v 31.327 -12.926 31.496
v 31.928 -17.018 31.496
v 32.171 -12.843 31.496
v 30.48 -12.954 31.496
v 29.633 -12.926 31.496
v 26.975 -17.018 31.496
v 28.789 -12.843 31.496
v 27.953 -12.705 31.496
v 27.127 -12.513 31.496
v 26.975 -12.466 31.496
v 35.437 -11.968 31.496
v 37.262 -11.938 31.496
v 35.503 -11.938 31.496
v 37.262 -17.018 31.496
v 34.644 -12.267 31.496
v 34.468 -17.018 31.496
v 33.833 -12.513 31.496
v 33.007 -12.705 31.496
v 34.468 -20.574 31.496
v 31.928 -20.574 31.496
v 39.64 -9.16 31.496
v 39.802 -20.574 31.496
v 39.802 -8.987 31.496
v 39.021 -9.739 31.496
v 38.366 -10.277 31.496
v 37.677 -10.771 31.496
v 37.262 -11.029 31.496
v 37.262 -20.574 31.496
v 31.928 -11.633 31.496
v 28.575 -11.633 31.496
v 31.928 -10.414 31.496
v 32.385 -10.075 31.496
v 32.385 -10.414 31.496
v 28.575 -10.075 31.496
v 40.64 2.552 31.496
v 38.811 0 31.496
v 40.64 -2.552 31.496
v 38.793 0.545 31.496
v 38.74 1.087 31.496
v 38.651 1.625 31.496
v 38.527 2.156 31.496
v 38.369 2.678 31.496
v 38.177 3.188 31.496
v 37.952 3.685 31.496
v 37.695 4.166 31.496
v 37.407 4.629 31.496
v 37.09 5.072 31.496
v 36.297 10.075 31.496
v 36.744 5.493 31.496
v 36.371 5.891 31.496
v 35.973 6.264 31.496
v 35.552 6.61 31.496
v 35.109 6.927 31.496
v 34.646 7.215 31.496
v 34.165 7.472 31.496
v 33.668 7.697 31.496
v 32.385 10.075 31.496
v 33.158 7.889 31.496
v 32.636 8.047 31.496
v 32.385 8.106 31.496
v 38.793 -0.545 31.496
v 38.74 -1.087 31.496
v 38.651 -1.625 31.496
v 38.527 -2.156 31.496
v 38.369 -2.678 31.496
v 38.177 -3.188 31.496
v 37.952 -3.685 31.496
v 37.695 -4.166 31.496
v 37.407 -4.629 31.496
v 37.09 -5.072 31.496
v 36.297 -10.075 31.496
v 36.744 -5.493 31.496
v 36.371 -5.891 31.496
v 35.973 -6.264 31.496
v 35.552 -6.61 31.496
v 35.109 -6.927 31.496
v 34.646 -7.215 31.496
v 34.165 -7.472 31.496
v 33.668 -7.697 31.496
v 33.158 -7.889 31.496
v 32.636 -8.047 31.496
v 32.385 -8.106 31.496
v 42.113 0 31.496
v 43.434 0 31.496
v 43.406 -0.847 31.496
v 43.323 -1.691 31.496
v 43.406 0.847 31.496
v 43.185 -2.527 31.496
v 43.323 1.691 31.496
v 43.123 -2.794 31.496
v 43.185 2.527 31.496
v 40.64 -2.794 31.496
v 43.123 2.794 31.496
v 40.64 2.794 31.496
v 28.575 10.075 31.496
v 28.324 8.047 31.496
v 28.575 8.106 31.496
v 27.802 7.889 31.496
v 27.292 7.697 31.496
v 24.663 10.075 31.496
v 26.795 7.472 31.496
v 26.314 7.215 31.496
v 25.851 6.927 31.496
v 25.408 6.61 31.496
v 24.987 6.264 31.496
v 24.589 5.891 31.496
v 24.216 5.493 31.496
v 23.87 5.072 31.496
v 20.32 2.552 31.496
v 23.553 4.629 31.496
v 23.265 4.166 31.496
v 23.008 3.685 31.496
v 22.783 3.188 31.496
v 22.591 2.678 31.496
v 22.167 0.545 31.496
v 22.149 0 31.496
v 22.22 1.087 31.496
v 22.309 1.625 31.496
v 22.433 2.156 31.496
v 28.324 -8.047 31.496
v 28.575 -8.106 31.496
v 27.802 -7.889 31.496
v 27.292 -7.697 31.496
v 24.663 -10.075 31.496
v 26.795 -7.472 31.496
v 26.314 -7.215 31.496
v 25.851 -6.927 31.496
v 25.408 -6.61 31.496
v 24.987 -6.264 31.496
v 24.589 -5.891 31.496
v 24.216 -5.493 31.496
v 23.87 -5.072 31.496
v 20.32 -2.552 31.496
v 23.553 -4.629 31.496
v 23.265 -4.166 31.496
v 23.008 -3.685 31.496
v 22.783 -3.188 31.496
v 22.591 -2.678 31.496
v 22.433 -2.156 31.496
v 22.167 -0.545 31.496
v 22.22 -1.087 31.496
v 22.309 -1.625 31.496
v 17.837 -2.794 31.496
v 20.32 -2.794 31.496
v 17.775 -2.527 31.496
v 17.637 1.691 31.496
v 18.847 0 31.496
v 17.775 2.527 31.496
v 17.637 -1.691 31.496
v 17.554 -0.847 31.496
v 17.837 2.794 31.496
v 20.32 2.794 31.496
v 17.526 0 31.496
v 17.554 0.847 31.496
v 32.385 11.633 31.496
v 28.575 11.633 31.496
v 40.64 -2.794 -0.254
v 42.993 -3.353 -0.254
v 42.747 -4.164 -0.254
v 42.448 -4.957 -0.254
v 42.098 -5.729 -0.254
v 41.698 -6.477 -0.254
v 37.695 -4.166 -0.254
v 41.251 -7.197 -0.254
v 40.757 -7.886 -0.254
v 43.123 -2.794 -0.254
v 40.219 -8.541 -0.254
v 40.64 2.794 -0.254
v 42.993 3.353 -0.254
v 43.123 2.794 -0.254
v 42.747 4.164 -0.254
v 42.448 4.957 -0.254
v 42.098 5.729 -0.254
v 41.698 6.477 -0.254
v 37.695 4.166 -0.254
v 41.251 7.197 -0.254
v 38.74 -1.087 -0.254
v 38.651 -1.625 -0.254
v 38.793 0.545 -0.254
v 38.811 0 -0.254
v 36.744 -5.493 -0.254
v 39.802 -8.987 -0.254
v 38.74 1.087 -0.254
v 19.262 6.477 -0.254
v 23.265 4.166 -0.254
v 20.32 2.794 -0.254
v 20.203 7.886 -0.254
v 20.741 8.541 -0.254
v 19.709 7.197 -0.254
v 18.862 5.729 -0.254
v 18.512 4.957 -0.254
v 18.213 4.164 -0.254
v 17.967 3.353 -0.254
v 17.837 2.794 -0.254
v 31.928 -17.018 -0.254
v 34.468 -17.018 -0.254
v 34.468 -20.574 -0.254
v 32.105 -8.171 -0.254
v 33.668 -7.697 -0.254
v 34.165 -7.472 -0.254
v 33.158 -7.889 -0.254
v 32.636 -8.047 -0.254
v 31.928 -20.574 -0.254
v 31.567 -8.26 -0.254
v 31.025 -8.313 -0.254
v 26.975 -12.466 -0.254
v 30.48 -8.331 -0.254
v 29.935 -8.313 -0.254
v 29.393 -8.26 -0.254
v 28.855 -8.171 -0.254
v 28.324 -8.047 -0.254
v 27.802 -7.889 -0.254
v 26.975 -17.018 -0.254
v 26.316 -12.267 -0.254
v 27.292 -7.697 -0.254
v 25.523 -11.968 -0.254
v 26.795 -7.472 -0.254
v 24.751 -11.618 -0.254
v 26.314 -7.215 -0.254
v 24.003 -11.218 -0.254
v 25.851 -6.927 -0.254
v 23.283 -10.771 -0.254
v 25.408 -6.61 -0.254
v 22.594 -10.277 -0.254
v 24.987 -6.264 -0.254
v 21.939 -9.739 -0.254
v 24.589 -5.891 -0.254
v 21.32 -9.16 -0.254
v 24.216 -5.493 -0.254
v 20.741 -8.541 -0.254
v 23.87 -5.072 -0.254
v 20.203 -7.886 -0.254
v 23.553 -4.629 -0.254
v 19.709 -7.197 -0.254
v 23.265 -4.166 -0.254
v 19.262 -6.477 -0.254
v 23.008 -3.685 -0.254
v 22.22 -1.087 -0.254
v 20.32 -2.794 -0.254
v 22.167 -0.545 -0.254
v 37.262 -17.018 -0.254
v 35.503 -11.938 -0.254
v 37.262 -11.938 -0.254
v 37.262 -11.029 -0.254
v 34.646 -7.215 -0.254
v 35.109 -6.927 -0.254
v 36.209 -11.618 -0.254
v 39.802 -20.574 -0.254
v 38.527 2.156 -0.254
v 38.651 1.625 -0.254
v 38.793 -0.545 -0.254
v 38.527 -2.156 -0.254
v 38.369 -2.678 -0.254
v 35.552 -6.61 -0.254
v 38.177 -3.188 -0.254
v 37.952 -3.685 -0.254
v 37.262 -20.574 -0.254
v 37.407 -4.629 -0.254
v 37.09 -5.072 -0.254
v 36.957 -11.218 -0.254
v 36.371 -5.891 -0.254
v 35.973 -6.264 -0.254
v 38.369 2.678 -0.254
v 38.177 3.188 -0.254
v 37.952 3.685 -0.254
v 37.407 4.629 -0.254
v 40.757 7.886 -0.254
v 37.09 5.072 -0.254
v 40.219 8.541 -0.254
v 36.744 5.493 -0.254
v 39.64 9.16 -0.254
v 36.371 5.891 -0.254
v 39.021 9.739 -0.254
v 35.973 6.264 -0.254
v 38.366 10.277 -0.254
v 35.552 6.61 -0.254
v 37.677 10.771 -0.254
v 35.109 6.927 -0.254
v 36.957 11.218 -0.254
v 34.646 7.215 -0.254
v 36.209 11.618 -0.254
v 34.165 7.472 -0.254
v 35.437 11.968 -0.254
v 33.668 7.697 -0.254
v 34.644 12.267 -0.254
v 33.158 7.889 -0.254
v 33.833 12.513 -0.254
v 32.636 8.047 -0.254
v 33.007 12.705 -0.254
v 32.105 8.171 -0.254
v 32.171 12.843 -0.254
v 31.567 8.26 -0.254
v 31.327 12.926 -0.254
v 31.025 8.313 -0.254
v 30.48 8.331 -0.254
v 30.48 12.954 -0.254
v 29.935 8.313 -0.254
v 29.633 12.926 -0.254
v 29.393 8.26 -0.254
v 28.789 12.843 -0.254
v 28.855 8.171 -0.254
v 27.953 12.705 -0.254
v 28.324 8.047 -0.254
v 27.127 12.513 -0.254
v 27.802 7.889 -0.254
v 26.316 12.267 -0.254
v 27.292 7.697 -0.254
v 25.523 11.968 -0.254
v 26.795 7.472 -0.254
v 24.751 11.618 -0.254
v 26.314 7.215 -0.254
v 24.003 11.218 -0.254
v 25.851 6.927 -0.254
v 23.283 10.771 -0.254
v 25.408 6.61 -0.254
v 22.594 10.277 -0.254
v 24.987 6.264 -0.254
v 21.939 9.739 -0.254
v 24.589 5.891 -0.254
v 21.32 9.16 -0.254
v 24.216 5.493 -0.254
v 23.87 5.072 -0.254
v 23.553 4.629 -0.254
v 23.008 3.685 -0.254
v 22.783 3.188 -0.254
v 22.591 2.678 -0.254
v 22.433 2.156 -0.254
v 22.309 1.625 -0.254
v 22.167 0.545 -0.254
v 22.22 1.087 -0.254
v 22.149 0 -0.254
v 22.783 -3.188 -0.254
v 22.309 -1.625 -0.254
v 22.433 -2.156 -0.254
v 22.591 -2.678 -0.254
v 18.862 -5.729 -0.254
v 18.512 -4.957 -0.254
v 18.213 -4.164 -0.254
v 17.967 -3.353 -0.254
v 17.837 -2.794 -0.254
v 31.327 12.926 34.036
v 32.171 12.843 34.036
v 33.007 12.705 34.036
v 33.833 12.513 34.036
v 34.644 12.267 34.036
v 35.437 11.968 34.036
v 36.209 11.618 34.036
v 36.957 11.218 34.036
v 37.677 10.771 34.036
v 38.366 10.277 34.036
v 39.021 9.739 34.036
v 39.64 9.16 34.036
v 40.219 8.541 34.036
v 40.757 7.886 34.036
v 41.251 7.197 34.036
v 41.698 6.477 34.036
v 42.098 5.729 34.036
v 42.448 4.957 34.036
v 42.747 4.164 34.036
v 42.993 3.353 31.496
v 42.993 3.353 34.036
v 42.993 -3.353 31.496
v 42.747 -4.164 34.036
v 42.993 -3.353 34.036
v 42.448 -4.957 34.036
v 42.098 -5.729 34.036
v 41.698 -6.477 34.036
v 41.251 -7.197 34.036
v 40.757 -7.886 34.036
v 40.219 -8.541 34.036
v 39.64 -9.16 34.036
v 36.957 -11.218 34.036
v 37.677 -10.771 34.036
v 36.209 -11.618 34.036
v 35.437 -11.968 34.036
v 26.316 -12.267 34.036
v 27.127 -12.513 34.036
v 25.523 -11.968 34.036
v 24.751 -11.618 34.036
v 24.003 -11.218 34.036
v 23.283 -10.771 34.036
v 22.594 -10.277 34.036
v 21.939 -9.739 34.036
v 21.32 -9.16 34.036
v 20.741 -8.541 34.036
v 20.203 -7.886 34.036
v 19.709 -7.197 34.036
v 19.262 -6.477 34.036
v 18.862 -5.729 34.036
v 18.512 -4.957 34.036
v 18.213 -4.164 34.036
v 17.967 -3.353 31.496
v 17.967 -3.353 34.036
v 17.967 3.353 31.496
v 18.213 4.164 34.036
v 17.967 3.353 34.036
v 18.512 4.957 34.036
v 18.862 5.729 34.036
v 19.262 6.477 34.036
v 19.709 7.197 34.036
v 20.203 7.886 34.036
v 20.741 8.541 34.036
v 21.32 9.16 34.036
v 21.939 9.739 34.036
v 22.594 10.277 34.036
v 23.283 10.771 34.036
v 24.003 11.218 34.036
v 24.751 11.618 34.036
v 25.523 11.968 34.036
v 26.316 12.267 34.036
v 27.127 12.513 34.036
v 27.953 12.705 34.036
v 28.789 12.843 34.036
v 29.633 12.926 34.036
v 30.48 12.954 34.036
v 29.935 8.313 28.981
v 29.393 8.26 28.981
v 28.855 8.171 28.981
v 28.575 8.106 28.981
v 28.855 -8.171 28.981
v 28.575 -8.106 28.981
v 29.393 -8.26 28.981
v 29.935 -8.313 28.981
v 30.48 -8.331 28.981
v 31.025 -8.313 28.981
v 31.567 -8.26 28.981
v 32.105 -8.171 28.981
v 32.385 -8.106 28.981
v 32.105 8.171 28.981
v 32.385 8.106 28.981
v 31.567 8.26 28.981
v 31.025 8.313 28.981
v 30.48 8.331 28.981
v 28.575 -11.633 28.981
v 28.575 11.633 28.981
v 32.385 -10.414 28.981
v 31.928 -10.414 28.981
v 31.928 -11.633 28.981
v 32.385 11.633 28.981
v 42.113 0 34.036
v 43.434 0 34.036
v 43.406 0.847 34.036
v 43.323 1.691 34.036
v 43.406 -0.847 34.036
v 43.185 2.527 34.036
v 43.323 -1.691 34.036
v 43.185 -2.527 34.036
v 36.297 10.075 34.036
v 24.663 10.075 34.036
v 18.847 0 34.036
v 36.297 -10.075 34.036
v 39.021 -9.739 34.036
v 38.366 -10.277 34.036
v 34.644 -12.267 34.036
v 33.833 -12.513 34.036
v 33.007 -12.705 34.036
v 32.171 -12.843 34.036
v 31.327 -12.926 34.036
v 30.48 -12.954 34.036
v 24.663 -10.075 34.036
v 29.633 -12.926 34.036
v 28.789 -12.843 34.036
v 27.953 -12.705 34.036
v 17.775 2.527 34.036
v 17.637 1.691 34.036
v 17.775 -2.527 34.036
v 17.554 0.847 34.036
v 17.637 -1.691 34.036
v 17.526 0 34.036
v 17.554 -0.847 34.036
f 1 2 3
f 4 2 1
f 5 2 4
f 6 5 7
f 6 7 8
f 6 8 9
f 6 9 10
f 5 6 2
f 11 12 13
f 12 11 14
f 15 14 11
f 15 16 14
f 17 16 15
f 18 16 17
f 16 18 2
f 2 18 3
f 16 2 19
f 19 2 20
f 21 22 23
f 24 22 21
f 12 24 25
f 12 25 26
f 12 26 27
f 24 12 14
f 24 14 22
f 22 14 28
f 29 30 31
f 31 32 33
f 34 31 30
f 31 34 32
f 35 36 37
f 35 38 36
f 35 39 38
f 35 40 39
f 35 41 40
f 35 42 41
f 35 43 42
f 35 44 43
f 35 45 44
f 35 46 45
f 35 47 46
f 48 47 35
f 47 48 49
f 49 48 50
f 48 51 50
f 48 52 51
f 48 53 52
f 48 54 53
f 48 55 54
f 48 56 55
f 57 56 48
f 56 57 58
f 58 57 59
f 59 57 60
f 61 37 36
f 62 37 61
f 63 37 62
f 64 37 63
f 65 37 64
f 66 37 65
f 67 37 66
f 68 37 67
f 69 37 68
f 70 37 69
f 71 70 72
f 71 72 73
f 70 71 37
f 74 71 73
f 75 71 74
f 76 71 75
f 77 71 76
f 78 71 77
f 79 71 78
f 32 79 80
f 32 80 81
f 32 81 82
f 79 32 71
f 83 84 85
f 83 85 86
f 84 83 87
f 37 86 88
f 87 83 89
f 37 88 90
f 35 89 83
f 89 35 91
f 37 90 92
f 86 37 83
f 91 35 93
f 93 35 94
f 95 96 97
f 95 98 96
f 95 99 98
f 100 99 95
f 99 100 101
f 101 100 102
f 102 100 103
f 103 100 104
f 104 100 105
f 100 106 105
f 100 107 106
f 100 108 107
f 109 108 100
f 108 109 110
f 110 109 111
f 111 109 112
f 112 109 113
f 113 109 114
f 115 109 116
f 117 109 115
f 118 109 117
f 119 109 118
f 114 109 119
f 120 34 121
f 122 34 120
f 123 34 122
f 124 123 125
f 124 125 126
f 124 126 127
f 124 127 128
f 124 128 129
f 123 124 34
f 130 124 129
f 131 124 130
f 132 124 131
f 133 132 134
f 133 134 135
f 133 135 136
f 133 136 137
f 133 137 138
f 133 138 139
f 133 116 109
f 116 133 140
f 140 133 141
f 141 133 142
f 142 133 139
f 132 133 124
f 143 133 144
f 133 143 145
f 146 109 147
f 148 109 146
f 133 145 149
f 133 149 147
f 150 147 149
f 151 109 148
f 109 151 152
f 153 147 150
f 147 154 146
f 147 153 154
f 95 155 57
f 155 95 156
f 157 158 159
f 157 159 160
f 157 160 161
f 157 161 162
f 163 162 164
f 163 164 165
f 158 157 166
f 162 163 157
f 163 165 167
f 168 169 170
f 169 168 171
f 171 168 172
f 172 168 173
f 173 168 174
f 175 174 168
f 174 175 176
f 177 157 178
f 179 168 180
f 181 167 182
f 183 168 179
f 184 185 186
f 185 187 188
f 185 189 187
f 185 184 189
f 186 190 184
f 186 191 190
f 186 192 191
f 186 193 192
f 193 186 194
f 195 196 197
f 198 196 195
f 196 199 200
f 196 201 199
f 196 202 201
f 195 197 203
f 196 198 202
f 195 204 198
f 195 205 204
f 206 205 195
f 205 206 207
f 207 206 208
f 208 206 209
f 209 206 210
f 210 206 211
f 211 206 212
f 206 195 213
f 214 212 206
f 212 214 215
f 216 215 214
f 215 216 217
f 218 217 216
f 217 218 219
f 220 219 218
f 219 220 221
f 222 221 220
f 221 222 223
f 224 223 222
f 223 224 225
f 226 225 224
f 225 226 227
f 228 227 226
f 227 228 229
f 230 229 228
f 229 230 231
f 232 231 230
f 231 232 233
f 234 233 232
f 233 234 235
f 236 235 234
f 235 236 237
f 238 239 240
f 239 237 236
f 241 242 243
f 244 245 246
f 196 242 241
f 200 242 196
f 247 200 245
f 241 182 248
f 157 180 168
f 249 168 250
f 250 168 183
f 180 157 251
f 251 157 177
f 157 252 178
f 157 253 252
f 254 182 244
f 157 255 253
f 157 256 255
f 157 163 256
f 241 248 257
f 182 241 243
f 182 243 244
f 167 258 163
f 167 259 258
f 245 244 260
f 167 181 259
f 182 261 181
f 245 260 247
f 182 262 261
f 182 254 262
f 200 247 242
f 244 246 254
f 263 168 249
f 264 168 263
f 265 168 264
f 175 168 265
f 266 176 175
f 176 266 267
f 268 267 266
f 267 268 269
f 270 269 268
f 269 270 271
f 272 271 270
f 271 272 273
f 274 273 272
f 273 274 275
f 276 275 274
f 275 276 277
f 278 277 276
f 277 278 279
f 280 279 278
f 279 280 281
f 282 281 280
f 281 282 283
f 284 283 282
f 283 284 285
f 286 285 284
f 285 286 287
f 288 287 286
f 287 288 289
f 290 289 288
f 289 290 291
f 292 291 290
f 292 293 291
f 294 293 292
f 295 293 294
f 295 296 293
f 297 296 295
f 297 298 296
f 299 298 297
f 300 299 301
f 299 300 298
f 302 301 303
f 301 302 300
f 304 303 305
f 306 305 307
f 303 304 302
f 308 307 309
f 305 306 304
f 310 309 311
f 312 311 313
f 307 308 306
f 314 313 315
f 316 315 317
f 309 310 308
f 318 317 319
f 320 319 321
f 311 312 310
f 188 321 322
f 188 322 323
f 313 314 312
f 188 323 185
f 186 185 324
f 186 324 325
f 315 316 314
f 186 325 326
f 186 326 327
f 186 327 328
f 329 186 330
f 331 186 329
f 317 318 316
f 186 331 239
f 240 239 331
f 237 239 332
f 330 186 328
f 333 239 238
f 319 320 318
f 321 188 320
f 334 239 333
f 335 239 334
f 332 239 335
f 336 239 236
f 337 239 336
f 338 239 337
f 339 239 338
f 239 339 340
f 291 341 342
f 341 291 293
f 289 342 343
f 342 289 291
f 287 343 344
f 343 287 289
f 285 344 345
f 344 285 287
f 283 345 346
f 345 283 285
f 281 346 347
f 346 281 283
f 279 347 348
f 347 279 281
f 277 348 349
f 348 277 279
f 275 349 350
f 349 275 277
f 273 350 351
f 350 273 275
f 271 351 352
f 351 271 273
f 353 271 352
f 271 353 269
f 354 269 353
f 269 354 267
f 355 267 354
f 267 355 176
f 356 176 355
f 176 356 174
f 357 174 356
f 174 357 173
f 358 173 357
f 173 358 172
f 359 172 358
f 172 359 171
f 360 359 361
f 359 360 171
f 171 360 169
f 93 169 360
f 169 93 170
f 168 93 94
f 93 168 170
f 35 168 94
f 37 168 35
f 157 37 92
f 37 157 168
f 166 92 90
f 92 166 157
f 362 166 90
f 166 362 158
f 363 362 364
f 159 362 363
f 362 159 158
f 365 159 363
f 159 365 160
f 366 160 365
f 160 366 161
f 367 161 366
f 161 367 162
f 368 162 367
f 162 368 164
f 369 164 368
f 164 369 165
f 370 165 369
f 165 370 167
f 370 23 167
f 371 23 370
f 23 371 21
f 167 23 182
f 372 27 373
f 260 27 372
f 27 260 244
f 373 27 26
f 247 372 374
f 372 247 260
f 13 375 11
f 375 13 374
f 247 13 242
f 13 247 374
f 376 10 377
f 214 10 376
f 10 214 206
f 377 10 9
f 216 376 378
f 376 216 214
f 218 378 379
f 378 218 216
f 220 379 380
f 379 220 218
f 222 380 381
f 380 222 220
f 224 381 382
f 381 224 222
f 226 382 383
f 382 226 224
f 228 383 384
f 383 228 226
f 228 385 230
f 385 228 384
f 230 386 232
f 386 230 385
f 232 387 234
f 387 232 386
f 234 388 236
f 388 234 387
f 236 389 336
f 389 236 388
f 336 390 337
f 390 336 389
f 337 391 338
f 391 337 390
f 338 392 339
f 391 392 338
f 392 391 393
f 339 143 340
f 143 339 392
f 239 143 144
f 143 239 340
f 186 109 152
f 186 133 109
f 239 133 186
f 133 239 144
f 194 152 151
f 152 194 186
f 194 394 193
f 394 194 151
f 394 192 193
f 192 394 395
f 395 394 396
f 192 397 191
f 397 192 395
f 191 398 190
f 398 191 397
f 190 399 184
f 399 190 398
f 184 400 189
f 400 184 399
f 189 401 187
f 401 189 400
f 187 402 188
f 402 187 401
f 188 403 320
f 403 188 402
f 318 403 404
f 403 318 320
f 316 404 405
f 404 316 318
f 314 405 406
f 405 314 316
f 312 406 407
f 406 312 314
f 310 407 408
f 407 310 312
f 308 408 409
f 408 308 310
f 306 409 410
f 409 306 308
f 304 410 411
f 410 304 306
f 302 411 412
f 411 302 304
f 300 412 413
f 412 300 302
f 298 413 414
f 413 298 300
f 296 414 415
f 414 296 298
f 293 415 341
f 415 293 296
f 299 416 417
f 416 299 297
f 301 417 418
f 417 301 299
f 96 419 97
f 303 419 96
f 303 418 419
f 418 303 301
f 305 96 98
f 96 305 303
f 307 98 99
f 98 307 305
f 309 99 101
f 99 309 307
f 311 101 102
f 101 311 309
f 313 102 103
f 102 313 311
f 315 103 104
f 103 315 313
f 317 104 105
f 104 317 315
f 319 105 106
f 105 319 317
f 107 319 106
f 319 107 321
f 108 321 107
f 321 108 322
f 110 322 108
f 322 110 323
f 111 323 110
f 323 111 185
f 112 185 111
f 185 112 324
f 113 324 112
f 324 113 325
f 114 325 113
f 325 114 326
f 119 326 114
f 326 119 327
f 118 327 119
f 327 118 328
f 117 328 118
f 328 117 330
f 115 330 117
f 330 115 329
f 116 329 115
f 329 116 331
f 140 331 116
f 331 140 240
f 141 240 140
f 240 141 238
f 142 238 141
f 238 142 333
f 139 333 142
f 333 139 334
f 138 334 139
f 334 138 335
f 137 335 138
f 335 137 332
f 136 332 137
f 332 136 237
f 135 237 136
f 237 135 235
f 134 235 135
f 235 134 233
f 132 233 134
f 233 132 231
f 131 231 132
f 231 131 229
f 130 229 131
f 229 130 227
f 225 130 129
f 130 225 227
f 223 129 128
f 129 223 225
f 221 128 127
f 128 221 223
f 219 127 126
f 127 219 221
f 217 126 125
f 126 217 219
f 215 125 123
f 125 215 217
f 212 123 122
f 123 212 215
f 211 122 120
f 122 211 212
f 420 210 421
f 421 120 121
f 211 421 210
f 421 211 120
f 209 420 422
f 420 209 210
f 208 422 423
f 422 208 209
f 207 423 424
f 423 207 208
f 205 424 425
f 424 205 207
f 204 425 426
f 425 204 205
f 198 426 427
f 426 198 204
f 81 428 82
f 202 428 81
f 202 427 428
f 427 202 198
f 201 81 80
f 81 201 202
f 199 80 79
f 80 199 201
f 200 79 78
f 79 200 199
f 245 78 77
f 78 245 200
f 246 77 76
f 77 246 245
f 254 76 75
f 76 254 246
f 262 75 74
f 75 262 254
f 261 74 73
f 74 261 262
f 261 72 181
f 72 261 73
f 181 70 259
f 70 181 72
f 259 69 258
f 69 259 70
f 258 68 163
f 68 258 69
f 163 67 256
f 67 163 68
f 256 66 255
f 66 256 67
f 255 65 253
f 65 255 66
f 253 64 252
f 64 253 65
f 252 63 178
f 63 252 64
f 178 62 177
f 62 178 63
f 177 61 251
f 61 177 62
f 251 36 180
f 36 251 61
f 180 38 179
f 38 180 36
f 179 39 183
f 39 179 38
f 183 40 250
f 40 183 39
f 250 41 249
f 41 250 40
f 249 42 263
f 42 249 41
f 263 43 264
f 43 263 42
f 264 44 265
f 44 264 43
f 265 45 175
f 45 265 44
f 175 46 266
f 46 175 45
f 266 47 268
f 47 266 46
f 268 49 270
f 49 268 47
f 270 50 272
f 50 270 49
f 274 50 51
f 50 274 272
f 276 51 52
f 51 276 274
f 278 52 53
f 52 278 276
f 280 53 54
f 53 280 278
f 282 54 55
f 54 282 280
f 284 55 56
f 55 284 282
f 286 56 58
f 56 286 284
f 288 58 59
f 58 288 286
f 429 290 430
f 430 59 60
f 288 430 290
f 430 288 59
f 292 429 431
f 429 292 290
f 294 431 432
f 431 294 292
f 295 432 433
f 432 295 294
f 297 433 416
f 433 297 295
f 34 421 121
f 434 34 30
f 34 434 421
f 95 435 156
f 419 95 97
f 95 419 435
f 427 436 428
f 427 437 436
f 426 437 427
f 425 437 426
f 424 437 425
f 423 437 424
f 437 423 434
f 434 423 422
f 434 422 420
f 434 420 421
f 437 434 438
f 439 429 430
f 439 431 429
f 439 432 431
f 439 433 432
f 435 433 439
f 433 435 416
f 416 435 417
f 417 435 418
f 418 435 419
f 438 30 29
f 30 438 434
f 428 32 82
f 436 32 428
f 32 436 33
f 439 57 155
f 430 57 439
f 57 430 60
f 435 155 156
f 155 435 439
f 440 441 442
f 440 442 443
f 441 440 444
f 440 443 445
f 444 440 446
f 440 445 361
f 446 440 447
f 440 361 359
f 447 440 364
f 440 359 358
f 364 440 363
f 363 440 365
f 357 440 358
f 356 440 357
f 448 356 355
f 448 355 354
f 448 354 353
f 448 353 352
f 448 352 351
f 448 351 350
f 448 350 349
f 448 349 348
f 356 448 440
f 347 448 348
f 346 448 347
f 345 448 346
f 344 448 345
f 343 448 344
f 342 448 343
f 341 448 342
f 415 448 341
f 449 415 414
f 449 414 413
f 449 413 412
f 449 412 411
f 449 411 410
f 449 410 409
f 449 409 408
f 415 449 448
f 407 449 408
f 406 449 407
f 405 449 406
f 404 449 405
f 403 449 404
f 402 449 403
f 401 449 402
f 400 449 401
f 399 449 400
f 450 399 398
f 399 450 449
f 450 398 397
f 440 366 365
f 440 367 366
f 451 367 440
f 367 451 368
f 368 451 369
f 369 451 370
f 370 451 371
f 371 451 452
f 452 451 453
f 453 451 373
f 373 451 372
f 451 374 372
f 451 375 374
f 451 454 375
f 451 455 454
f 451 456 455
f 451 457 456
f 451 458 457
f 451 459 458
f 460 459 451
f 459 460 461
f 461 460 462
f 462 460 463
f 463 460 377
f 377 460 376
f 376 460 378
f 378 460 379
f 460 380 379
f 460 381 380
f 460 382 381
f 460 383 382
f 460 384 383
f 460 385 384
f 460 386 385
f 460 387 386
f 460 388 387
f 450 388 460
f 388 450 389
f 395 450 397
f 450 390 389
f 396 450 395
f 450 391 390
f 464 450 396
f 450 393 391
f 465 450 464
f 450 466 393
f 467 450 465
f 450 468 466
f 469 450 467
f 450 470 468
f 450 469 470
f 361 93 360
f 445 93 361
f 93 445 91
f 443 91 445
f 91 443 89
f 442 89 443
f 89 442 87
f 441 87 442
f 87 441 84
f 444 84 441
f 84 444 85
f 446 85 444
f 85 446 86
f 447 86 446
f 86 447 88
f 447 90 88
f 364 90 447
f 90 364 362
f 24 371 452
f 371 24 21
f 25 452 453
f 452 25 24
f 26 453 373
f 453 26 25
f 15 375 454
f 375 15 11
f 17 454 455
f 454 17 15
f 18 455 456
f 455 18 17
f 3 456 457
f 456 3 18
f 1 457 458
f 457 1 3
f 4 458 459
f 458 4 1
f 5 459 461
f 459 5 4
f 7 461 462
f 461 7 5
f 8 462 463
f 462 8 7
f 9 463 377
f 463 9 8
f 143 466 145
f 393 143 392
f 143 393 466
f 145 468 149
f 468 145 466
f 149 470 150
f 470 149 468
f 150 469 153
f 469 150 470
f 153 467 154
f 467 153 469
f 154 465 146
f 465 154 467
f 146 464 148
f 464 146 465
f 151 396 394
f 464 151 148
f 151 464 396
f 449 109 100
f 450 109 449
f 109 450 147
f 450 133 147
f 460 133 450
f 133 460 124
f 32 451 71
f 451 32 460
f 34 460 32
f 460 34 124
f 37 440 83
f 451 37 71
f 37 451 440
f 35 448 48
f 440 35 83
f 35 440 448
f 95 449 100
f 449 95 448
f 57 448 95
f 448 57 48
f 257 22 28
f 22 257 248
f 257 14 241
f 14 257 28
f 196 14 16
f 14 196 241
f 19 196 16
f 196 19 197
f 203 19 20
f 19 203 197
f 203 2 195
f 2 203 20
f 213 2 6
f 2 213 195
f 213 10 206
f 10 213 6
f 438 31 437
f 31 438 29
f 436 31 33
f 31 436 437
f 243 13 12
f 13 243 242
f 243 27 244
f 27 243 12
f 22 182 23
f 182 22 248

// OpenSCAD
ViewScale = [0.0254, 0.0254, 0.0254];

MountD = 1020;
MountR = MountD/2;
//LedD = 793;
LedD = 916;
LedR = LedD/2;
LensD = 680;
LensR = LensD/2;

module ledMount(ext)
{
    linear_extrude(100)
    difference() {
        circle(MountR, $fn=96);
        circle(LedR, $fn=6);
    }
    translate([0, 0, 100])
    difference()
    {
    linear_extrude(250+ext)
    difference() {
        circle(MountR, $fn=96);
        circle(LedR-130, $fn=96);
        translate([MountR, 0, 0]) square(220, center=true);
        translate([-MountR, 0, 0]) square(220, center=true);
    }
    translate([0, 0, -1])
    linear_extrude(100)
    square([150, LedD], center=true);
    }

    translate([0, 0, 100])
    linear_extrude(250+ext)
    translate([212, MountR, 0]) 
    {
    translate([-105, 100, 0])
    square([100, 400], center=true);
    translate([105, 50, 0])
    square([100, 500], center=true);
    translate([-100, 60, 0])
    square([500, 200], center=true);
    }
}

module lensMount()
{
    linear_extrude(50)
    difference() {
        circle(MountR, $fn=96);
        circle(LensR, $fn=96);
    }
    translate([0, 0, 50])
    linear_extrude(40)
    {
    difference() {
        circle(MountR, $fn=96);
        circle(LensR-20, $fn=96);
    }
    }
    // tab
    translate([0, 0, -240])
    linear_extrude(240)
    translate([MountR-40, 0, 0])
    square([100, 210], center=true);

    // tab
    translate([0, 0, -240])
    linear_extrude(240)
    translate([-MountR+40, 0, 0])
    square([100, 210], center=true);
}

scale(ViewScale)
{
//    translate([0, 0, 340+500])
//    rotate([180, 0, 0])
//    ledMount(500);

    translate([1200, 0, 340+1000])
    rotate([180, 0, 0])
    ledMount(1000);

//    translate([0, 1500, 90])
//    rotate([180, 0, 0])
//    lensMount();
}
